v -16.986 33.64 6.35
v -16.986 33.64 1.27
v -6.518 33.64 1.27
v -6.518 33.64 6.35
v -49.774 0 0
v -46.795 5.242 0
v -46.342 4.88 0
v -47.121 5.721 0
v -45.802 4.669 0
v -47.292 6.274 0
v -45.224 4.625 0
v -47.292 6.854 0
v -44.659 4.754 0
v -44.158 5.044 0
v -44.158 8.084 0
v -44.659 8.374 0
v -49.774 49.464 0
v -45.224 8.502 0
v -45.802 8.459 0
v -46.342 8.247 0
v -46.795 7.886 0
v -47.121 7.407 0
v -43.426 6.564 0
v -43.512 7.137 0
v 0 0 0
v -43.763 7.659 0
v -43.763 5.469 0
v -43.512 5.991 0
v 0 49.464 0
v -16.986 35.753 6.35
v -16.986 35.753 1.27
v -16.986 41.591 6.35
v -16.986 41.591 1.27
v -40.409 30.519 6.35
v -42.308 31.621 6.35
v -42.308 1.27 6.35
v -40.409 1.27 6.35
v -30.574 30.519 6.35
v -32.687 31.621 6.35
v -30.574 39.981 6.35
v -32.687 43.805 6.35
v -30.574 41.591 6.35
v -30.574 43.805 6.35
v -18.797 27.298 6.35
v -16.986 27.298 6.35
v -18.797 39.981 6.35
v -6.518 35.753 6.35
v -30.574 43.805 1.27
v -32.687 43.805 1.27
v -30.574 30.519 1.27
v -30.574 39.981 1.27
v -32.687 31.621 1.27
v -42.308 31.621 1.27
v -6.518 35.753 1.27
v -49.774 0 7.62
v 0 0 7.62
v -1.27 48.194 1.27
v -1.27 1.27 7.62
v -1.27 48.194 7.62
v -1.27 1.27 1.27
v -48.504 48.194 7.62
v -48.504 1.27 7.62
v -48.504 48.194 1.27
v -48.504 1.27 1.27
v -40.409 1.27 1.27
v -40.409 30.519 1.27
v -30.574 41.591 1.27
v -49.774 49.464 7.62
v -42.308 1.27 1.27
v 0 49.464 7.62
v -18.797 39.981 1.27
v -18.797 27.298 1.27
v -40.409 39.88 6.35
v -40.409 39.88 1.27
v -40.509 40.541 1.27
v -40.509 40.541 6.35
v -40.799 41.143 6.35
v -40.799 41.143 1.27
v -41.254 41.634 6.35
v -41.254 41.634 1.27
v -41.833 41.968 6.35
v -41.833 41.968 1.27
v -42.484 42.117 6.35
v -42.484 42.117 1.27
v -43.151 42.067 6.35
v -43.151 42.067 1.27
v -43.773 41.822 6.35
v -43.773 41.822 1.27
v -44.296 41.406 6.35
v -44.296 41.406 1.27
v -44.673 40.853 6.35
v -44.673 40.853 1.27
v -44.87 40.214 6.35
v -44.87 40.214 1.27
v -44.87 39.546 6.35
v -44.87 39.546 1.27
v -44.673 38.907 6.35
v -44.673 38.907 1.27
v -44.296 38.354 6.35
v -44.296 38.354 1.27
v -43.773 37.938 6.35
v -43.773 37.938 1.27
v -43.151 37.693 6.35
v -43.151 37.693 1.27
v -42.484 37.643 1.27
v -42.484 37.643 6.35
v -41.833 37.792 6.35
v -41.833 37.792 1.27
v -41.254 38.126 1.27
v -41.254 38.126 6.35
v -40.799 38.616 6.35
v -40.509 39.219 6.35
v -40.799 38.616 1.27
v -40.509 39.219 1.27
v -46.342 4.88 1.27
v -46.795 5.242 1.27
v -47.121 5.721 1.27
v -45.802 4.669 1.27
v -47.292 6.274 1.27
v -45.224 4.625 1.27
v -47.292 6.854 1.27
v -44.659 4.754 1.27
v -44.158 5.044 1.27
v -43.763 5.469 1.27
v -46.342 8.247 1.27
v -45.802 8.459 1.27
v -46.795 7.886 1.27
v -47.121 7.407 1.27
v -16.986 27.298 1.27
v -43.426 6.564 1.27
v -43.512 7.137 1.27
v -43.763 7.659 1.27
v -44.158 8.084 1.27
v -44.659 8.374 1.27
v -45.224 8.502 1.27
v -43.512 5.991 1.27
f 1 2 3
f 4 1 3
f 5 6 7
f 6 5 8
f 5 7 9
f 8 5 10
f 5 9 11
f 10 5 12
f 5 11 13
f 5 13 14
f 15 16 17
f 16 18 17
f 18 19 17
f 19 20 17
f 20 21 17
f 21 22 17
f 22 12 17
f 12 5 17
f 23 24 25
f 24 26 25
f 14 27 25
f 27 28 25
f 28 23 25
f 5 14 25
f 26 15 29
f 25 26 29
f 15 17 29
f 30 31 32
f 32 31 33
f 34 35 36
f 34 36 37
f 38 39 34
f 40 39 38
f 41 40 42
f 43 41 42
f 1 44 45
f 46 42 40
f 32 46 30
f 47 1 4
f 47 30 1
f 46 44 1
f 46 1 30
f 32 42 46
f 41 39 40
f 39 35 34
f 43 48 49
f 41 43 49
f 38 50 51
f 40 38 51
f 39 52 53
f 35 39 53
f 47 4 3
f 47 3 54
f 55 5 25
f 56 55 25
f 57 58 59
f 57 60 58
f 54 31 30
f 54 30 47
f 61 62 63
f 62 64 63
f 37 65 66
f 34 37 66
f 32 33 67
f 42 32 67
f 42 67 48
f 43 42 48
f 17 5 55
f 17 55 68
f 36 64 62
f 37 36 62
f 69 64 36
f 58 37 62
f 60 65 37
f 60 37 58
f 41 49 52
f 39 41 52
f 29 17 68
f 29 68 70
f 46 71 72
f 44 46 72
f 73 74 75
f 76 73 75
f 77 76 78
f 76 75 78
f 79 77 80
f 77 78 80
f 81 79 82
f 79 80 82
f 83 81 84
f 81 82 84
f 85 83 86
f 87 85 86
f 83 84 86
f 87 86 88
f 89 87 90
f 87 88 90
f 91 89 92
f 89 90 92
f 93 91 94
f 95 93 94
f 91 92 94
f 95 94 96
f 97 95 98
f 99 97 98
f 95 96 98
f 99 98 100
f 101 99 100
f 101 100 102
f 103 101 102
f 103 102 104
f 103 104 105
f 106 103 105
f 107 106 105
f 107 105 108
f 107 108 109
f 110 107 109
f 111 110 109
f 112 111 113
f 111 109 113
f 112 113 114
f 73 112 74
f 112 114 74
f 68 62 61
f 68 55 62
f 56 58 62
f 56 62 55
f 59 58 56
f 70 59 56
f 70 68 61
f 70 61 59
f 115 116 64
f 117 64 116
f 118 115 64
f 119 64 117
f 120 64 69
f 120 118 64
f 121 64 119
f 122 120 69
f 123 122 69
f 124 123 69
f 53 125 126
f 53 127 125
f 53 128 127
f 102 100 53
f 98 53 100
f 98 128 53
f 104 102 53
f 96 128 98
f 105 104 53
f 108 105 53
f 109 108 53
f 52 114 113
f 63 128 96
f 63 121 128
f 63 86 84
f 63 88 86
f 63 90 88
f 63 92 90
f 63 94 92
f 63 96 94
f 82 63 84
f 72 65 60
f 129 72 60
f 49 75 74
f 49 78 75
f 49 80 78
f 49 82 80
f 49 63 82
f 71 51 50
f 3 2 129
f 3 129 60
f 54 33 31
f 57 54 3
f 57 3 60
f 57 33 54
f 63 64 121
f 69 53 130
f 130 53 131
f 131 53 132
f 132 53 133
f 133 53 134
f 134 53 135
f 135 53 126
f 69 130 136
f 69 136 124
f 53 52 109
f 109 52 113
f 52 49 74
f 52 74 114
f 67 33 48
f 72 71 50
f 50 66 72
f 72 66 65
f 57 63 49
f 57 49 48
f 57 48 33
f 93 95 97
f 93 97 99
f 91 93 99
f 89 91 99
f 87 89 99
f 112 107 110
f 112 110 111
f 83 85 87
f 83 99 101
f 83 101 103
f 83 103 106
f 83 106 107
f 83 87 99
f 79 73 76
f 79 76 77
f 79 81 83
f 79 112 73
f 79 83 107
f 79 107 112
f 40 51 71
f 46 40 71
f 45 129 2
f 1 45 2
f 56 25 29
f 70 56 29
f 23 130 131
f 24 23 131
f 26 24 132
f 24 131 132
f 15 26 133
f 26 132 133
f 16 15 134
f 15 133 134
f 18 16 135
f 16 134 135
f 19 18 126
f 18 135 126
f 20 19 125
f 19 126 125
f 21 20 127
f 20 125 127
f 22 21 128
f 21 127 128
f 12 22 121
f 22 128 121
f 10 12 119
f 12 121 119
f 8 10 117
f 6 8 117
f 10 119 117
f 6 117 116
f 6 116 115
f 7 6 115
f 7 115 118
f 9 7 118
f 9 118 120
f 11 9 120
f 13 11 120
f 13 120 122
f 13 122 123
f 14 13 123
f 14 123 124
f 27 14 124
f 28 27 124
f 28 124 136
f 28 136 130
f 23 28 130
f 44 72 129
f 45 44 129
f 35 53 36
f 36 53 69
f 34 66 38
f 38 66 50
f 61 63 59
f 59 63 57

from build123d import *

# Parameters (mm, degrees)
F0_W     = 49.773663
F0_H     = 49.463548
F1_DEPTH = 7.62
F2_T     = -1.27
F4_DEPTH = 5.08
F3_W     = 10.467866
F3_H     = 2.113704
F3_R     = 2.24296
F5_DEPTH = 5.08
F6_R     = 1.943924
F7_DEPTH = 5.08


with BuildPart() as f1:
    # F0 (on Top) → F1 (new body)
    with BuildSketch(Plane.XY):
        with Locations((-24.886831, 24.731774)):
            Rectangle(F0_W, F0_H)
    extrude(amount=F1_DEPTH)

    # F2
    f2_openings = [f1.faces().sort_by_distance(p)[0] for p in [
        (-24.886832, 24.731774, 7.62),
    ]]
    offset(amount=F2_T, openings=f2_openings)

    # F3 (on face) → F4 (join)
    with BuildSketch(Plane.XY.offset(1.27)):
        Polygon((-42.308204, 31.621417), (-42.308204, 1.27), (-40.409051, 1.27), (-40.409051, 30.519297), (-40.409051, 31.621417), align=None)
    extrude(amount=F4_DEPTH)

    # F3 (on face) → F5 (join)
    with BuildSketch(Plane.XY.offset(1.27)):
        Polygon((-42.308204, 31.621417), (-42.308204, 1.27), (-40.409051, 1.27), (-40.409051, 30.519297), (-40.409051, 31.621417), align=None)
        Polygon((-40.409051, 31.621417), (-40.409051, 30.519297), (-30.573701, 30.519297), (-30.573701, 31.621417), (-32.687407, 31.621417), align=None)
        Polygon((-32.687407, 43.805435), (-32.687407, 31.621417), (-30.573701, 31.621417), (-30.573701, 39.980639), (-30.573701, 41.591078), (-30.573701, 43.805435), align=None)
        Polygon((-30.573701, 41.591078), (-30.573701, 39.980639), (-18.797351, 39.980639), (-16.985605, 39.980639), (-16.985605, 41.591078), align=None)
        Polygon((-16.985605, 39.980639), (-18.797351, 39.980639), (-18.797351, 27.298415), (-16.985605, 27.298415), (-16.985605, 33.639527), (-16.985605, 35.753231), align=None)
        with Locations((-11.751672, 34.696379)):
            Rectangle(F3_W, F3_H)
        with Locations((-42.652011, 39.879985)):
            Circle(F3_R)
    extrude(amount=F5_DEPTH)

    # F6 (on face) → F7 (cut)
    with BuildSketch(Plane.XY.offset(1.27)):
        with Locations((-45.369629, 6.563986)):
            Circle(F6_R)
    extrude(amount=-F7_DEPTH, mode=Mode.SUBTRACT)


solid = f1.part
